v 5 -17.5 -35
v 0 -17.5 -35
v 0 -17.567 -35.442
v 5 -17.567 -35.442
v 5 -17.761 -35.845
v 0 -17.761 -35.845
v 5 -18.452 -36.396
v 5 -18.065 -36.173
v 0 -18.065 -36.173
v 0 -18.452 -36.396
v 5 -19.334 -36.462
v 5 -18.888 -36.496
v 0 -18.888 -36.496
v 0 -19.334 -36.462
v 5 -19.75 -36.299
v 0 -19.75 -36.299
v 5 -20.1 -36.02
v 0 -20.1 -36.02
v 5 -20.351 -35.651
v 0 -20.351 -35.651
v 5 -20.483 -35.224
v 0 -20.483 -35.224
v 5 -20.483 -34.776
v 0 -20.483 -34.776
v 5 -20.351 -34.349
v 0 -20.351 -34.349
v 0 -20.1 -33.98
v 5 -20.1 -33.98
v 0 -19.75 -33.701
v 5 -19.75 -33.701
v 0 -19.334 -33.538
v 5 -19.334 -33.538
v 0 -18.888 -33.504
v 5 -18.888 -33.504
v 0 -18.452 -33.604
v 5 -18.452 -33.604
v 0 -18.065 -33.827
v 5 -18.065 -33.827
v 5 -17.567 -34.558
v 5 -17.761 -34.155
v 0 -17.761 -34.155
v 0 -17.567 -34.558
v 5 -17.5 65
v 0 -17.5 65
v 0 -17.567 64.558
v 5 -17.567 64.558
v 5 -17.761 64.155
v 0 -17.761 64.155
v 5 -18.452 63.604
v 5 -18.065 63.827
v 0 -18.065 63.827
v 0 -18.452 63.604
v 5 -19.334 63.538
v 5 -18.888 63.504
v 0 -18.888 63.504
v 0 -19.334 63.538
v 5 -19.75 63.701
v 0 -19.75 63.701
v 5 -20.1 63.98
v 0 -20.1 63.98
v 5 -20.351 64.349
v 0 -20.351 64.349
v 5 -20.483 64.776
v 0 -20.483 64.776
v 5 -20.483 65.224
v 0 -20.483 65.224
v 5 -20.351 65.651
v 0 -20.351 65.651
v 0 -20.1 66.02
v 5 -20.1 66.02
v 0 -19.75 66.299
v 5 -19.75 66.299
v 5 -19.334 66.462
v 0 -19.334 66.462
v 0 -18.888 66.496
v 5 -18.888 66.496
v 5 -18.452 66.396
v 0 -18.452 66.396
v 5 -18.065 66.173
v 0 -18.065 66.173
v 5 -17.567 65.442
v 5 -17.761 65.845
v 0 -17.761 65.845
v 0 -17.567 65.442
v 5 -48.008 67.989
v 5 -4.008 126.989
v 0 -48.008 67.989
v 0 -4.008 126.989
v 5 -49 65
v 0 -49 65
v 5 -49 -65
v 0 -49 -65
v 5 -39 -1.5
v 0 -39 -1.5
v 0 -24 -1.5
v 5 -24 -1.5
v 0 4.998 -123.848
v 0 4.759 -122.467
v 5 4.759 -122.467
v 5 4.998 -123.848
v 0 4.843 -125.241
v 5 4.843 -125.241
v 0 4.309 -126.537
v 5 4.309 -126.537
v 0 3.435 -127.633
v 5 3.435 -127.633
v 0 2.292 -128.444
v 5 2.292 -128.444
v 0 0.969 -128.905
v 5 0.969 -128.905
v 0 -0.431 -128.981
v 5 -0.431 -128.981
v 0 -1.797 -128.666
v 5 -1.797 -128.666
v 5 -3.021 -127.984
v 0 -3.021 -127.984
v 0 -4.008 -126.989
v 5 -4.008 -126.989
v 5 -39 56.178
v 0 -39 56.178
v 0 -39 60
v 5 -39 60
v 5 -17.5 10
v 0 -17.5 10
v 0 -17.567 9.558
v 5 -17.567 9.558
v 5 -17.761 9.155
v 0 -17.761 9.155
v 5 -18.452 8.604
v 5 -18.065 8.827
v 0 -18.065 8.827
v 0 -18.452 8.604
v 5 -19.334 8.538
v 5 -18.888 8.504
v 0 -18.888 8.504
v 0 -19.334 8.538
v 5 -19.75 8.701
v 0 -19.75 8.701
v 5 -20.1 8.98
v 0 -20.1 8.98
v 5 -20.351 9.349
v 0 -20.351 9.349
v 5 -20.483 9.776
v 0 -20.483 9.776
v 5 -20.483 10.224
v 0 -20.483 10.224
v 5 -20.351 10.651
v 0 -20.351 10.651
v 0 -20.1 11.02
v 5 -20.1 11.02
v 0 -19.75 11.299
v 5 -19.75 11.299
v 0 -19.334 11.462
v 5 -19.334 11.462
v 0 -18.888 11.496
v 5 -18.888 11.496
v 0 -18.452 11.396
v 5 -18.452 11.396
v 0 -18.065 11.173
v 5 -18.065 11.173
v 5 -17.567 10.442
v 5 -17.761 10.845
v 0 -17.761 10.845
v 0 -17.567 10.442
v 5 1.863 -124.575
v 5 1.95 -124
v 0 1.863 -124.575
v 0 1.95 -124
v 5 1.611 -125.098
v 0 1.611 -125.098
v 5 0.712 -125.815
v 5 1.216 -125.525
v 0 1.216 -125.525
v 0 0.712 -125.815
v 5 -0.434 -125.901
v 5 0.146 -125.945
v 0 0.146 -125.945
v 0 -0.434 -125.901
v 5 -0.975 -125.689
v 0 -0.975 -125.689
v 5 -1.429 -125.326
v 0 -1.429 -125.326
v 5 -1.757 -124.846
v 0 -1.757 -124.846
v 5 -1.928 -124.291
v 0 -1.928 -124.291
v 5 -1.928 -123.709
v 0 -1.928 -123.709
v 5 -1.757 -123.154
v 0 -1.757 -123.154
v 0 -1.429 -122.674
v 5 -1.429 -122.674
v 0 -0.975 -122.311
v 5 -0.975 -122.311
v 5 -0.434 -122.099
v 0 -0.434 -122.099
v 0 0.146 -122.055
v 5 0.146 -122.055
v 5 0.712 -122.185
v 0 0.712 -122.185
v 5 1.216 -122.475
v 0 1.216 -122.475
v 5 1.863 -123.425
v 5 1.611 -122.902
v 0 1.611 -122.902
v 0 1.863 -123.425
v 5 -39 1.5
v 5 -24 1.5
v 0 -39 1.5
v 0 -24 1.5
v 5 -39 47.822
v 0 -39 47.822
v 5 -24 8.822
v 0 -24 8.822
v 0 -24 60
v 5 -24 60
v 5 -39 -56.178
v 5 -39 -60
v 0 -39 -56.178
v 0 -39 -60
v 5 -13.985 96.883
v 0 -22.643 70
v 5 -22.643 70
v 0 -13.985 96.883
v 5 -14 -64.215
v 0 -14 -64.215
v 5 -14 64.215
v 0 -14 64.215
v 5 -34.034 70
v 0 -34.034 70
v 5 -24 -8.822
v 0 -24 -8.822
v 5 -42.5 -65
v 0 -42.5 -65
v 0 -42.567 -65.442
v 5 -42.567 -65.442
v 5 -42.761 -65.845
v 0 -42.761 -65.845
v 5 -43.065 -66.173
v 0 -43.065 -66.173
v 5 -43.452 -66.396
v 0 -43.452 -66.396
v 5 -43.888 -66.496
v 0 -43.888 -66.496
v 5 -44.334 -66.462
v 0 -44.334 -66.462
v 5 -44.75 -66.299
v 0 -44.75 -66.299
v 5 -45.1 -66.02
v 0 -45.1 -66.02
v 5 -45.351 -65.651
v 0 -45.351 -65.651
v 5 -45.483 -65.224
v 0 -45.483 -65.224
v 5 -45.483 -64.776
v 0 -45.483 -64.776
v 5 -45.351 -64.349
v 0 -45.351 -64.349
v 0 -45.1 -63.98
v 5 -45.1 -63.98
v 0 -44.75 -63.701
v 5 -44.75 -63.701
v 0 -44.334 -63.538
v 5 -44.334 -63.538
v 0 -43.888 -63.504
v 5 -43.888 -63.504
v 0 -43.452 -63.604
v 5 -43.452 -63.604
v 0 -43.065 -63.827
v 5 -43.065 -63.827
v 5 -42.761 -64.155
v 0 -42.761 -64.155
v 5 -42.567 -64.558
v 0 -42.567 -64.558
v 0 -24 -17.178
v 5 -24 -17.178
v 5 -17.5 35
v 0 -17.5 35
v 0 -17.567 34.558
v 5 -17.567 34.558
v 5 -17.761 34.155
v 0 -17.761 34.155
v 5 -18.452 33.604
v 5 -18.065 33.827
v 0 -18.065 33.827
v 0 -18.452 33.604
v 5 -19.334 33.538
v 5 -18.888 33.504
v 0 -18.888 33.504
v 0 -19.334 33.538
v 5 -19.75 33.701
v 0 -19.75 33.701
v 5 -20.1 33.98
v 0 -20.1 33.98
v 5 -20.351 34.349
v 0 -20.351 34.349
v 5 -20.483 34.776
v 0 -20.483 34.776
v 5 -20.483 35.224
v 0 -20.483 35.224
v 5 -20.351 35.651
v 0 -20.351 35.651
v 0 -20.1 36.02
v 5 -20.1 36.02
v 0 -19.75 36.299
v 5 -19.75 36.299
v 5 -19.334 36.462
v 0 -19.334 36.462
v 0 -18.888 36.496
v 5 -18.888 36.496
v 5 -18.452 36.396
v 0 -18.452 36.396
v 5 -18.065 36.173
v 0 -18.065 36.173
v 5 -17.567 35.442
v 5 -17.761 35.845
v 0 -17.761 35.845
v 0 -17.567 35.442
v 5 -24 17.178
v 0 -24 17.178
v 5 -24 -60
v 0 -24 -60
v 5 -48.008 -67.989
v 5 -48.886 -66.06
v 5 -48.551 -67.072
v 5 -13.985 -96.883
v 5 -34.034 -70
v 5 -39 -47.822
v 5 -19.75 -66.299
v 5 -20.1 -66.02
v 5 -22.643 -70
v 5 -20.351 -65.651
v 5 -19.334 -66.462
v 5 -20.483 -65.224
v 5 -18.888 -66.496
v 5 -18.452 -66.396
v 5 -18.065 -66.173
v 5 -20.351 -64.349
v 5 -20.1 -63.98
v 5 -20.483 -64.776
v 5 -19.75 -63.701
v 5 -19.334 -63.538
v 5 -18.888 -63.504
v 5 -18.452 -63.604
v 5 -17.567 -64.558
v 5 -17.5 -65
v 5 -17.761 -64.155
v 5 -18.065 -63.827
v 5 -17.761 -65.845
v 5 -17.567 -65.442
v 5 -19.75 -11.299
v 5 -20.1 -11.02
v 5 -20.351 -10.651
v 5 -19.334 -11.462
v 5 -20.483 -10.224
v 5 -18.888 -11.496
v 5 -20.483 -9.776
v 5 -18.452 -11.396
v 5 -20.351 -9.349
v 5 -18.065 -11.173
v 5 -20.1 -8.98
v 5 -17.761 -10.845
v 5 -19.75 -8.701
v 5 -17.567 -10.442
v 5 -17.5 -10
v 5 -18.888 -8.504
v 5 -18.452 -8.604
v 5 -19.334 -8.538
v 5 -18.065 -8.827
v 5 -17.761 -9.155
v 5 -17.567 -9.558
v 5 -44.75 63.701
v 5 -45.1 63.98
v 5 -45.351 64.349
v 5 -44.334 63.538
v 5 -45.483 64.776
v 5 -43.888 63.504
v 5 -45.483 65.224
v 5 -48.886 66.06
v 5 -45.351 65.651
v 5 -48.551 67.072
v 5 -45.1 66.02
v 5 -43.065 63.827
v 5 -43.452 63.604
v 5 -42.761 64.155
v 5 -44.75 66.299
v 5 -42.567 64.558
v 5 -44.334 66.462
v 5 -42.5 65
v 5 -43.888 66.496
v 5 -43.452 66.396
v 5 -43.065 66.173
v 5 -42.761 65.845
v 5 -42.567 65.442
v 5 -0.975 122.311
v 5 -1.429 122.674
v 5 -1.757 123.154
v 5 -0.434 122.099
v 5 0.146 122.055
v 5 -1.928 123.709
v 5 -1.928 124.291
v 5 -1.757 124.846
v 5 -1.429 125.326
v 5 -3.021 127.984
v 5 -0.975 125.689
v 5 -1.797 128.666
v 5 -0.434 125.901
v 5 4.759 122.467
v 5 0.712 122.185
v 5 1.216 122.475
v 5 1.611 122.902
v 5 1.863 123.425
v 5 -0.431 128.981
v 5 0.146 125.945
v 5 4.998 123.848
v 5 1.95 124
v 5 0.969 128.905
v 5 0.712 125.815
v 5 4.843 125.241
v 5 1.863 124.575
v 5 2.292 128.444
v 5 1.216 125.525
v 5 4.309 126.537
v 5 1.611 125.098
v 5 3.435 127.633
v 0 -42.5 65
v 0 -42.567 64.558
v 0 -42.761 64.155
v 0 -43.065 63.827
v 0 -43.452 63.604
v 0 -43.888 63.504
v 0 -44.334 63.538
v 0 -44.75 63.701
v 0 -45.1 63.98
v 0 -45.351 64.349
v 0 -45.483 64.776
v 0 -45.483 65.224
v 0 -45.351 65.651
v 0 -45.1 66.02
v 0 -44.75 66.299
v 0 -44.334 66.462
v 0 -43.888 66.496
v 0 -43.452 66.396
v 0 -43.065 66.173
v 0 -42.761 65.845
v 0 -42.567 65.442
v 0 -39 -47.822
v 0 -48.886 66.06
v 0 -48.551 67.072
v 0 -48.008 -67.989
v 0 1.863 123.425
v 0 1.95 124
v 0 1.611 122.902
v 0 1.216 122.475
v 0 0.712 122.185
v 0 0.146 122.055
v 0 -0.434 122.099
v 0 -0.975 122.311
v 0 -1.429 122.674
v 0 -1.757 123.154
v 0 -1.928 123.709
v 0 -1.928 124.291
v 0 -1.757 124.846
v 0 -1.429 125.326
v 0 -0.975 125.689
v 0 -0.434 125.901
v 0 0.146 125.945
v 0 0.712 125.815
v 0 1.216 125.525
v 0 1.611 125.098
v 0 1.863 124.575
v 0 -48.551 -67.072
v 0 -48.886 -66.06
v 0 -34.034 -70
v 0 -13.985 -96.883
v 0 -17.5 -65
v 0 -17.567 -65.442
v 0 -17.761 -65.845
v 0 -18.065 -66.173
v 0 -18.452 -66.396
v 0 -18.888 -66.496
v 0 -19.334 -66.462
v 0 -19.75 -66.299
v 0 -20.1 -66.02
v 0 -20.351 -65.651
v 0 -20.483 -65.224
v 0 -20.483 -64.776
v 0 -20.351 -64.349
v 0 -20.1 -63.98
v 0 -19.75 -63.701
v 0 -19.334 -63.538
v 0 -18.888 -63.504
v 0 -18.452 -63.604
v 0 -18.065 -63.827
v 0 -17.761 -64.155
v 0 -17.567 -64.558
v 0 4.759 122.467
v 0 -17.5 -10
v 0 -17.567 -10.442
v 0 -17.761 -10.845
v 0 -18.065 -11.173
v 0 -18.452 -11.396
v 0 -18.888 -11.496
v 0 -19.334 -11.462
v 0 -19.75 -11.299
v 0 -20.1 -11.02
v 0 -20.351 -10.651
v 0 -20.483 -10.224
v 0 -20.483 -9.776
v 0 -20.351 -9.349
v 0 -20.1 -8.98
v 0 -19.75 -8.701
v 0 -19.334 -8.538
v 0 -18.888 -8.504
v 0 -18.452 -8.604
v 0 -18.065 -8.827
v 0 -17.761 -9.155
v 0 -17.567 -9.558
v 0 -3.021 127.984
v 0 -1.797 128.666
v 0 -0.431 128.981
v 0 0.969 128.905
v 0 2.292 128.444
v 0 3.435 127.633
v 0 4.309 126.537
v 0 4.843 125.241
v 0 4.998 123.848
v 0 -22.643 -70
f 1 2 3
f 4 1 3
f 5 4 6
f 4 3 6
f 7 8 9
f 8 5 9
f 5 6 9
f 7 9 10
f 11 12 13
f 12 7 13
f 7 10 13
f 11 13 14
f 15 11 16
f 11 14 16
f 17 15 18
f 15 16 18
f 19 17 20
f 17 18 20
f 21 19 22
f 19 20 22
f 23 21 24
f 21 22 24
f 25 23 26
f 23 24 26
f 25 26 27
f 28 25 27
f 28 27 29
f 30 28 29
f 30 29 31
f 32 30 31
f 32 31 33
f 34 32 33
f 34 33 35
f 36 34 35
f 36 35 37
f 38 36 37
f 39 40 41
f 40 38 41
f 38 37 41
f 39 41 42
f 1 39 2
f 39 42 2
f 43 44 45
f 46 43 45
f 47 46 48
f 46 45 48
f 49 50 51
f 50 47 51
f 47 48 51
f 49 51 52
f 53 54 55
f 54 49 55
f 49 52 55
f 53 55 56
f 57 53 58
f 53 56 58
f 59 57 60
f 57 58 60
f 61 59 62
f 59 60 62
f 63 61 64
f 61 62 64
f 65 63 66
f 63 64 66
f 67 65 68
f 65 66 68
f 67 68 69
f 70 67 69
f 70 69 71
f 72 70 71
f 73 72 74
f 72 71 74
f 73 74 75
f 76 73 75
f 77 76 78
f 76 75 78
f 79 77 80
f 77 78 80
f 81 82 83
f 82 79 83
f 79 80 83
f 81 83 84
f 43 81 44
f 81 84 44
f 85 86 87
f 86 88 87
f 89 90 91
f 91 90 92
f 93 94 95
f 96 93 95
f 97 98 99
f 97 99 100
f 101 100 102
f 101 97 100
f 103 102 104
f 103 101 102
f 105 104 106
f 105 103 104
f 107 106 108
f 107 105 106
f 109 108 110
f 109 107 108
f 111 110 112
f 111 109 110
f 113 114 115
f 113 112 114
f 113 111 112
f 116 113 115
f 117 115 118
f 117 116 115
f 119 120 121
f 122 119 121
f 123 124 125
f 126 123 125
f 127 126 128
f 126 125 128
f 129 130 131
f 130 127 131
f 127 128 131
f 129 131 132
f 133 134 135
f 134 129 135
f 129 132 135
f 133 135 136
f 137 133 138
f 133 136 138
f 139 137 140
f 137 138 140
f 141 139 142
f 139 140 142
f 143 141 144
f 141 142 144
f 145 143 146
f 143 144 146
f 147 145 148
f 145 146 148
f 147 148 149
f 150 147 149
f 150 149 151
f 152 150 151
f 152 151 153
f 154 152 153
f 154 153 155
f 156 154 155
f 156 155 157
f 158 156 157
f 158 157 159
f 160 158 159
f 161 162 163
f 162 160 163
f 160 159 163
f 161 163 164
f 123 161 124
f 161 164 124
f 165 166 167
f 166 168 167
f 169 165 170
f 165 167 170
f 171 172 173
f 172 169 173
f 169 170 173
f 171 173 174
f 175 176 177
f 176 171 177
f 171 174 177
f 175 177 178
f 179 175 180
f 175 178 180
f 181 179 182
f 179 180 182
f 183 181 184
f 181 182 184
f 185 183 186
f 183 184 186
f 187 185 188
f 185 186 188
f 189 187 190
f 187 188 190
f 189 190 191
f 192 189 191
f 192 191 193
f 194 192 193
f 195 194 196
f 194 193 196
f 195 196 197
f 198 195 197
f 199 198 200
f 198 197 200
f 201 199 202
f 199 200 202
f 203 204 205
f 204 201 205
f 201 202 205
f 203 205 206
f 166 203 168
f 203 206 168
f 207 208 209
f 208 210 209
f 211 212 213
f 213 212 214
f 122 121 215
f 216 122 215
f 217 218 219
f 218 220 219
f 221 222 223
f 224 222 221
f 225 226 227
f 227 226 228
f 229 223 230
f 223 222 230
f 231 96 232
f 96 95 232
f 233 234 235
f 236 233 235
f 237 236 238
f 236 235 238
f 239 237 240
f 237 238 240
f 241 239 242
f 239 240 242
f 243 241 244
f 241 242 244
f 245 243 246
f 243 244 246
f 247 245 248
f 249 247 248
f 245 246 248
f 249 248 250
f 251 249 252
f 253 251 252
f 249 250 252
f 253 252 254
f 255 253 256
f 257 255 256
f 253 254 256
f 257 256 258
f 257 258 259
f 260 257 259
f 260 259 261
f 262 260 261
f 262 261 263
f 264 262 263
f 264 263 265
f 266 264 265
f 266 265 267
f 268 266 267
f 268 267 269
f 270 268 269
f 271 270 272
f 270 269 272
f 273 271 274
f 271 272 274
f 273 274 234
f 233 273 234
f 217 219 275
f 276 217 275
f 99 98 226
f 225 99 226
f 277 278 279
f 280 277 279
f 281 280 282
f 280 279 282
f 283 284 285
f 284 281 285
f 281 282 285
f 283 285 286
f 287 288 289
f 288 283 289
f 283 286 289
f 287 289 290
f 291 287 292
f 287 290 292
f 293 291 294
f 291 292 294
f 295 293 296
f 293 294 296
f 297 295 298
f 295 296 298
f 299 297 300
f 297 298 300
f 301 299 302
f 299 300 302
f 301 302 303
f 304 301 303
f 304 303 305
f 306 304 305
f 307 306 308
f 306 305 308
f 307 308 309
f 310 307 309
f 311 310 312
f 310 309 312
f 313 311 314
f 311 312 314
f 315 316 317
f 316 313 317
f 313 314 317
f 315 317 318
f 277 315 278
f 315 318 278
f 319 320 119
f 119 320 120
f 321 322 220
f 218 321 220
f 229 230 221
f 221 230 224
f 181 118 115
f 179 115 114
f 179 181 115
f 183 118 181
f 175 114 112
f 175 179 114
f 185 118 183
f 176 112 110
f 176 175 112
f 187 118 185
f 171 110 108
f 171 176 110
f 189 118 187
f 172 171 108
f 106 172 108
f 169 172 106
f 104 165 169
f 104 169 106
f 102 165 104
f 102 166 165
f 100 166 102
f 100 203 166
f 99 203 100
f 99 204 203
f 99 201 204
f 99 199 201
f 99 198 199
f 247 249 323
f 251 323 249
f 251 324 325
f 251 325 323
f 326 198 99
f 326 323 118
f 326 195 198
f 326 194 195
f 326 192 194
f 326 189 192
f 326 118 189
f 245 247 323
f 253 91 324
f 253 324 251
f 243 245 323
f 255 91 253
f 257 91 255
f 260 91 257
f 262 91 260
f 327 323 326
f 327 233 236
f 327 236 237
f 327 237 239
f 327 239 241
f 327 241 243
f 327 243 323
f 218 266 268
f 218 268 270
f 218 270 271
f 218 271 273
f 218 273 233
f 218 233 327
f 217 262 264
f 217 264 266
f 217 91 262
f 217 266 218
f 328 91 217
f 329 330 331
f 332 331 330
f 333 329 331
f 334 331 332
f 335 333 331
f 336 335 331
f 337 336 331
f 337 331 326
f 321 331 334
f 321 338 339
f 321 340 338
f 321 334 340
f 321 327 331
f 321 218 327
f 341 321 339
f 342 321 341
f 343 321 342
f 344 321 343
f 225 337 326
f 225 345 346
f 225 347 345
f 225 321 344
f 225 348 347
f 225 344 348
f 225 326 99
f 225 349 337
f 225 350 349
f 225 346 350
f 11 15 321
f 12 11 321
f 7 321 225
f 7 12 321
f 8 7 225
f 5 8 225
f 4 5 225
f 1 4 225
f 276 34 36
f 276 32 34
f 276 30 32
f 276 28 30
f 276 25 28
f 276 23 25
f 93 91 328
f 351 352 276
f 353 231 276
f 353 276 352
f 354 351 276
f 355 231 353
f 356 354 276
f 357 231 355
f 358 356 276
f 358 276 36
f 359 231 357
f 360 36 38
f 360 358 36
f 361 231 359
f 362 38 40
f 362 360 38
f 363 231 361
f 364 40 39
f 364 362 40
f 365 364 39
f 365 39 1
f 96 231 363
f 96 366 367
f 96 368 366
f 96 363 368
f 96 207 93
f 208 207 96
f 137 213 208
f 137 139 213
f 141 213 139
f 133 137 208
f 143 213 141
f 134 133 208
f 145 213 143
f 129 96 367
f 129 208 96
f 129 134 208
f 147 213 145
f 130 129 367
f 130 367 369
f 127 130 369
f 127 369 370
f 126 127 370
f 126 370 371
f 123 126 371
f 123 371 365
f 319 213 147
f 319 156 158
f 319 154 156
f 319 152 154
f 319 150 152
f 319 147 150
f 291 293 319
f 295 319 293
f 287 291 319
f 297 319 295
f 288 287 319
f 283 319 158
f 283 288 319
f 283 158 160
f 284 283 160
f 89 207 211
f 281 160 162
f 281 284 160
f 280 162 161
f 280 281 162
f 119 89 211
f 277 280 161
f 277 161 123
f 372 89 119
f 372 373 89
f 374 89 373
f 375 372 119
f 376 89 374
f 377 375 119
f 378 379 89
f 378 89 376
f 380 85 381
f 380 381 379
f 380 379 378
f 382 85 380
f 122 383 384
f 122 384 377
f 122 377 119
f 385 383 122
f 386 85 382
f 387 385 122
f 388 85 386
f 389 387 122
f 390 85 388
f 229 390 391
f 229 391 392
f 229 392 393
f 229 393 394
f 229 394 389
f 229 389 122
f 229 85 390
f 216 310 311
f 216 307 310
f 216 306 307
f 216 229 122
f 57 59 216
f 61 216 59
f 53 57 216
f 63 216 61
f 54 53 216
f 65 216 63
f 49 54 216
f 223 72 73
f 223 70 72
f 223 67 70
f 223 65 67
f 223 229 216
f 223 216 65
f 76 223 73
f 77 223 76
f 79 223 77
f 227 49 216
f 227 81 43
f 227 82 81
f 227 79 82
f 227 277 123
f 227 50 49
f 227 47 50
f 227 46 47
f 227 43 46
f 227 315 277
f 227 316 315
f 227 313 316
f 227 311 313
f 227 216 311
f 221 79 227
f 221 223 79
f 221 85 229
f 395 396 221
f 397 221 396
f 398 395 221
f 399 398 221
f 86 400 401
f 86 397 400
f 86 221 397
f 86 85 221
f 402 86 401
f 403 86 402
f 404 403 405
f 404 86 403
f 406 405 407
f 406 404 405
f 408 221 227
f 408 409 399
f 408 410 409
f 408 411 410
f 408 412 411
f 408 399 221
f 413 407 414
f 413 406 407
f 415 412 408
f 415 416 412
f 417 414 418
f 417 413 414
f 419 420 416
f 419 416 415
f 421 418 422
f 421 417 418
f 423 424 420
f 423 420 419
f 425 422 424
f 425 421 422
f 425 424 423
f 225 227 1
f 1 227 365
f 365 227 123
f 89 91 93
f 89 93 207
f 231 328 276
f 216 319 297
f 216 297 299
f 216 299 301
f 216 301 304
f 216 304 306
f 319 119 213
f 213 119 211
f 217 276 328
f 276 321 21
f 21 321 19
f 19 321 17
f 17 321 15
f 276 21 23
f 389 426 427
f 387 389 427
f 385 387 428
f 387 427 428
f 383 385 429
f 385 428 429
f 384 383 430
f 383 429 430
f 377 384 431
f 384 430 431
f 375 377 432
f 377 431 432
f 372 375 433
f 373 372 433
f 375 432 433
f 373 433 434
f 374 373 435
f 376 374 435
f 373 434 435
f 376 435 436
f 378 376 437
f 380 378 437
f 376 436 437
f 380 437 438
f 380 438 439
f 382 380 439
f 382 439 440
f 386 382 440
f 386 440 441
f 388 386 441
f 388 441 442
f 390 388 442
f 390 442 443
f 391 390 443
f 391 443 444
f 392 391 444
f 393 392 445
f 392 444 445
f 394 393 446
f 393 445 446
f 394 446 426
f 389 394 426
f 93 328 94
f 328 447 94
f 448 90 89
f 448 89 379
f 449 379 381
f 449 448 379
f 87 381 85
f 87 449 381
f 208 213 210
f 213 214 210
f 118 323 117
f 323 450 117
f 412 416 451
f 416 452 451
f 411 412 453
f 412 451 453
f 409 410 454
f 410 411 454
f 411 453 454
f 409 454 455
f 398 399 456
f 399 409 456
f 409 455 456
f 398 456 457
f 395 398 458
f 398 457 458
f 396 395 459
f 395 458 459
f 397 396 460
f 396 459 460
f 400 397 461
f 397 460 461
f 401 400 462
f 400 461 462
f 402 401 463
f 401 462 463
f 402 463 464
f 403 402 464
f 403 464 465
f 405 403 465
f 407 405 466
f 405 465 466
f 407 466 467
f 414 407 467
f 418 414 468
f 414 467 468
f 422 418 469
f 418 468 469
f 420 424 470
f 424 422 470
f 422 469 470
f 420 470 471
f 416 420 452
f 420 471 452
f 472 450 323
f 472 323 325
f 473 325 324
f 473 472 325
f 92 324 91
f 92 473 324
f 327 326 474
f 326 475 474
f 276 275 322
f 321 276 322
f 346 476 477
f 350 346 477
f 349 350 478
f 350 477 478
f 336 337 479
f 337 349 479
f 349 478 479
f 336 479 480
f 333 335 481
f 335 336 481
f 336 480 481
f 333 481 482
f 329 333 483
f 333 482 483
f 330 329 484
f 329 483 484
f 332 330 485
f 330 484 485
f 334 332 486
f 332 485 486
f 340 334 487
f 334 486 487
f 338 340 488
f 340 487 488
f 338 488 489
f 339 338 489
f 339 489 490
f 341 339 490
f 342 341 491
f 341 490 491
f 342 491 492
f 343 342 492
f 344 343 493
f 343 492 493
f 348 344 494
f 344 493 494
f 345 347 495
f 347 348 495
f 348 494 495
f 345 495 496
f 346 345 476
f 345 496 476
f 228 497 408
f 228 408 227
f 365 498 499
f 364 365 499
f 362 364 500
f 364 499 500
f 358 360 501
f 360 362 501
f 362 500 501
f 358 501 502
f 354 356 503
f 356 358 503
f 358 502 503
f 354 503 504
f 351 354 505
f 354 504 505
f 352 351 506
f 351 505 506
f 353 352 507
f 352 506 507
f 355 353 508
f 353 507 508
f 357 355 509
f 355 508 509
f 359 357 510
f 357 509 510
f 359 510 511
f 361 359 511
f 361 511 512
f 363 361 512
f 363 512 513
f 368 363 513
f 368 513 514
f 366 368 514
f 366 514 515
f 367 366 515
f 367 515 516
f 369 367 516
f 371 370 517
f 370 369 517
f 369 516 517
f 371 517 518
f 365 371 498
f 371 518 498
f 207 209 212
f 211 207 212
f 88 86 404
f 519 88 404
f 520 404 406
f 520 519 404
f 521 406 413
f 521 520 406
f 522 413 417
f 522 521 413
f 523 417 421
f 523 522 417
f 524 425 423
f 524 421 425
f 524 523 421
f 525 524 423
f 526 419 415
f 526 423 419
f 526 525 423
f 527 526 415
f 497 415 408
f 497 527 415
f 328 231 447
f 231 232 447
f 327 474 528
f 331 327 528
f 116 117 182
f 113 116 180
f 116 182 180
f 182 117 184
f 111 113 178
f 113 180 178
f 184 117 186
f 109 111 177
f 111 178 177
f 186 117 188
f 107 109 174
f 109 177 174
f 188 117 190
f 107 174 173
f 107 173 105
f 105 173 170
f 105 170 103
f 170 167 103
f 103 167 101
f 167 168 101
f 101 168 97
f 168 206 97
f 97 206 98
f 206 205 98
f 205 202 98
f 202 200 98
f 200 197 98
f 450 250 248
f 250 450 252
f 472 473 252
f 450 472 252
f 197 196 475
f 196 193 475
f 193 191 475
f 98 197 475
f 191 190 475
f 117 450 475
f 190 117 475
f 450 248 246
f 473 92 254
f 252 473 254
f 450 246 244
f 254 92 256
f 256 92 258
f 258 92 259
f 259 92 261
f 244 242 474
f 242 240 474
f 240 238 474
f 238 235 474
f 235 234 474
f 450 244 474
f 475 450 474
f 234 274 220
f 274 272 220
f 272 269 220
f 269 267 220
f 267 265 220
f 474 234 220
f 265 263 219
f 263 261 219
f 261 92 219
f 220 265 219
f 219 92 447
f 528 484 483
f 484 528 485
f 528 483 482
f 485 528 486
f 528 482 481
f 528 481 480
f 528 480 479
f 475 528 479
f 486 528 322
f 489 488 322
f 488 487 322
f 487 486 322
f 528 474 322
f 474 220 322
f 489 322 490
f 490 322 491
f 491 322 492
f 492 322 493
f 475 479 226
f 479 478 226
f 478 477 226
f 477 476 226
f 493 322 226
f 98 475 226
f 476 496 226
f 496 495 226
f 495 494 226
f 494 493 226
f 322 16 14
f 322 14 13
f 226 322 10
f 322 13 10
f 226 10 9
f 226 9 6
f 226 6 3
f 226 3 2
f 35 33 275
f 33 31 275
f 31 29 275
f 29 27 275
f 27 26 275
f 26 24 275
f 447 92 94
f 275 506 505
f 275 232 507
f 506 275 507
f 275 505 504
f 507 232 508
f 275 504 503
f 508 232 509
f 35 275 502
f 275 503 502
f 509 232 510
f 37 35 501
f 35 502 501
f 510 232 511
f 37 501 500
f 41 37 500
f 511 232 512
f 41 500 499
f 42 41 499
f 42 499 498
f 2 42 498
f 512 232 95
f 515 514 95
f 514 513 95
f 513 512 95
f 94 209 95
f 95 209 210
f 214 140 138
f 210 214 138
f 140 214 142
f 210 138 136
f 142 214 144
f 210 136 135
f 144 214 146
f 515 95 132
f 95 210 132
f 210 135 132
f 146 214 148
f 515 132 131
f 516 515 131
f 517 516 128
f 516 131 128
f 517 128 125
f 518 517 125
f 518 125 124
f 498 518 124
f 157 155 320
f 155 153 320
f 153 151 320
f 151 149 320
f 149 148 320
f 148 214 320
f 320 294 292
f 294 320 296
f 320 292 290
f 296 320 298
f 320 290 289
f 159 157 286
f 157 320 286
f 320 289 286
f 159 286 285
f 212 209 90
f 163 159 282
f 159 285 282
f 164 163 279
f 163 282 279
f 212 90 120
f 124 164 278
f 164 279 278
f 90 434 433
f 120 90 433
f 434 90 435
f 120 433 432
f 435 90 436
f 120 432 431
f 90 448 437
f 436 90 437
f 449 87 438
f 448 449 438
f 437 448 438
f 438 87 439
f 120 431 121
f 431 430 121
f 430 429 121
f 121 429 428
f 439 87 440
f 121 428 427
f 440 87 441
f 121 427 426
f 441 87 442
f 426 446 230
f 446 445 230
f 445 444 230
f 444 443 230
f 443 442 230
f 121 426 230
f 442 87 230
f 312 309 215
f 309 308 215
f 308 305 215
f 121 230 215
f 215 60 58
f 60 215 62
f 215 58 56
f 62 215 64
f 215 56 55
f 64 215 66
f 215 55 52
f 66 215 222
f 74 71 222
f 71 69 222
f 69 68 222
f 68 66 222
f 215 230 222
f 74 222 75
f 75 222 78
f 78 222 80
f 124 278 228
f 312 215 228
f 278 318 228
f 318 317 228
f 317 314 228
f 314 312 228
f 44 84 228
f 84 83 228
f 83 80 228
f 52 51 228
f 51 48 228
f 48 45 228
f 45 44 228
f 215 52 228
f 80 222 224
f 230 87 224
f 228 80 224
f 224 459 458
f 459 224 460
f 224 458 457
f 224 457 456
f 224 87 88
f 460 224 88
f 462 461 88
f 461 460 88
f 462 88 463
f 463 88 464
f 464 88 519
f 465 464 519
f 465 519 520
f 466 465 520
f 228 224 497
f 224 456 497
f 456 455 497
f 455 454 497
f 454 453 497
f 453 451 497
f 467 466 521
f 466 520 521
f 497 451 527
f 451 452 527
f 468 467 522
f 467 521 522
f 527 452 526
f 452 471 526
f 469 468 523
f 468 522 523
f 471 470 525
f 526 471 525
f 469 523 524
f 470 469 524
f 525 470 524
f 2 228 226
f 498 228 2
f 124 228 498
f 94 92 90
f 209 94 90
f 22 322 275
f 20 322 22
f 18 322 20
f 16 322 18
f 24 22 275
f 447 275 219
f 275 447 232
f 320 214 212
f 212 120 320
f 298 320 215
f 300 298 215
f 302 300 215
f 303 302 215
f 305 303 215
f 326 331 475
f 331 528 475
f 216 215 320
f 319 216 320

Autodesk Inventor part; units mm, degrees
ref_plane "YZ Plane" through (0, 0, 0) normal (1, 0, 0) x (0, 1, 0)
ref_plane "XZ Plane" through (0, 0, 0) normal (0, 1, 0) x (-1, 0, 0)
sketch "Sketch1" plane through (0, 0, 0) normal (1, 0, 0) x (0, 1, 0)
  circle A0 centre (0, -124) radius 1.95
  circle A1 centre (0, 124) radius 1.95
  circle A2 centre (-19, -65) radius 1.5
  circle A3 centre (-19, 65) radius 1.5
  line L0 (0, 124) -> (-19, 65) construction
  line L1 (4.7593, 122.4673) -> (-14.2407, 63.4673)
  line L2 (-23.7593, 66.5327) -> (-4.7593, 125.5327)
  arc A4 (4.7593, 122.4673) -> (-4.7593, 125.5327) centre (0, 124) ccw
  arc A5 (-23.7593, 66.5327) -> (-14.2407, 63.4673) centre (-19, 65) ccw
  line L3 (-19, 65) -> (-19, -65) construction
  line L4 (-24, 65) -> (-24, -65)
  line L5 (-14, -65) -> (-14, 65)
  arc A6 (-14, 65) -> (-24, 65) centre (-19, 65) ccw
  arc A7 (-24, -65) -> (-14, -65) centre (-19, -65) ccw
  line L6 (-19, -65) -> (0, -124) construction
  line L7 (-23.7593, -66.5327) -> (-4.7593, -125.5327)
  line L8 (4.7593, -122.4673) -> (-14.2407, -63.4673)
  arc A8 (-14.2407, -63.4673) -> (-23.7593, -66.5327) centre (-19, -65) ccw
  arc A9 (-4.7593, -125.5327) -> (4.7593, -122.4673) centre (0, -124) ccw
  circle A10 centre (-44, 65) radius 1.5
  circle A11 centre (-44, -65) radius 1.5
  line L9 (-19, 65) -> (-44, 65) construction
  line L10 (-19, 70) -> (-44, 70)
  line L11 (-44, 60) -> (-19, 60)
  arc A12 (-19, 60) -> (-19, 70) centre (-19, 65) ccw
  arc A13 (-44, 70) -> (-44, 60) centre (-44, 65) ccw
  line L12 (-19, -65) -> (-44, -65) construction
  line L13 (-19, -60) -> (-44, -60)
  line L14 (-44, -70) -> (-19, -70)
  arc A14 (-19, -70) -> (-19, -60) centre (-19, -65) ccw
  arc A15 (-44, -60) -> (-44, -70) centre (-44, -65) ccw
  line L15 (0, 124) -> (-44, 65) construction
  line L16 (-4.0081, 126.9891) -> (-48.0081, 67.9891)
  line L17 (-39.9919, 62.0109) -> (4.0081, 121.0109)
  arc A16 (4.0081, 121.0109) -> (-4.0081, 126.9891) centre (0, 124) ccw
  arc A17 (-48.0081, 67.9891) -> (-39.9919, 62.0109) centre (-44, 65) ccw
  line L18 (-44, -65) -> (0, -124) construction
  line L19 (-48.0081, -67.9891) -> (-4.0081, -126.9891)
  line L20 (4.0081, -121.0109) -> (-39.9919, -62.0109)
  arc A18 (-39.9919, -62.0109) -> (-48.0081, -67.9891) centre (-44, -65) ccw
  arc A19 (-4.0081, -126.9891) -> (4.0081, -121.0109) centre (0, -124) ccw
  line L21 (-44, 65) -> (-44, -65) construction
  line L22 (-49, 65) -> (-49, -65)
  line L23 (-39, -65) -> (-39, 65)
  arc A20 (-39, 65) -> (-49, 65) centre (-44, 65) ccw
  arc A21 (-49, -65) -> (-39, -65) centre (-44, -65) ccw
  line L24 (-44, 65) -> (-19, 0) construction
  line L25 (-45.4, 64.4615) -> (-20.4, -0.5385)
  line L26 (-17.6, 0.5385) -> (-42.6, 65.5385)
  arc A22 (-42.6, 65.5385) -> (-45.4, 64.4615) centre (-44, 65) ccw
  arc A23 (-20.4, -0.5385) -> (-17.6, 0.5385) centre (-19, 0) ccw
  line L27 (-44, -65) -> (-19, 0) construction
  line L28 (-42.6, -65.5385) -> (-17.6, -0.5385)
  line L29 (-20.4, 0.5385) -> (-45.4, -64.4615)
  arc A24 (-45.4, -64.4615) -> (-42.6, -65.5385) centre (-44, -65) ccw
  arc A25 (-17.6, -0.5385) -> (-20.4, 0.5385) centre (-19, 0) ccw
  line L30 (-19, 0) -> (-44, 0) construction
  line L31 (-19, 1.5) -> (-44, 1.5)
  line L32 (-44, -1.5) -> (-19, -1.5)
  arc A26 (-19, -1.5) -> (-19, 1.5) centre (-19, 0) ccw
  arc A27 (-44, 1.5) -> (-44, -1.5) centre (-44, 0) ccw
  circle A28 centre (-19, -10) radius 1.5
  circle A29 centre (-19, -35) radius 1.5
  circle A30 centre (-19, 10) radius 1.5
  circle A31 centre (-19, 35) radius 1.5
  point P0 (0, 0)
  point P1 (-9.5, 94.5)
  point P2 (-9.5, -94.5)
  point P3 (-14, -64.2148)
  point P4 (-14, 64.2148)
  point P5 (-24, 65)
  point P6 (-31.5, 65)
  point P7 (-31.5, -65)
  point P8 (-22, 94.5)
  point P9 (-22, -94.5)
  point P10 (-44, 0)
  point P11 (-31.5, 32.5)
  point P12 (-31.5, -32.5)
  point P13 (-39, 47.8215)
  point P14 (-24, 8.8215)
  point P15 (-24, 17.1785)
  point P16 (-40.4698, 60)
  point P17 (-24, 60)
  point P18 (-22.6427, 70)
  point P19 (-34.0339, 70)
  point P20 (-13.9854, 96.8832)
  point P21 (-6.8749, 118.9633)
  point P22 (-43.3898, 70)
  point P23 (-49, 65)
  point P24 (-43.3898, -70)
  point P25 (-6.8749, -118.9633)
  point P26 (-13.9854, -96.8832)
  point P27 (-34.0339, -70)
  point P28 (-22.6427, -70)
  point P29 (-24, -60)
  point P30 (-40.4698, -60)
  point P31 (-24, -17.1785)
  point P32 (-24, -8.8215)
  point P33 (-39, -47.8215)
  point P34 (-31.5, 0)
  point P35 (-39, -1.5)
  point P36 (-24, -1.5)
  point P37 (-24, 1.5)
  point P38 (-39, 1.5)
  point P39 (-49, 65)
  point P40 (-4.0081, -126.9891)
  point P41 (-39, 60)
  point P42 (-39, -60)
  point P43 (-39, -56.1785)
  point P44 (-39, 56.1785)
  dimension "d2" = 3.9
  dimension "d4" = 3.9
  dimension "d25" = 3
  dimension "d28" = 3
  dimension "d43" = 59
  dimension "d44" = 65
  dimension "d45" = 65
  dimension "d47" = 59
  dimension "d48" = 10
  dimension "d49" = 10
  dimension "d50" = 10
  dimension "d52" = 14
  dimension "d53" = 3
  dimension "d54" = 3
  dimension "d55" = 10
  dimension "d56" = 10
  dimension "d57" = 25
  dimension "d58" = 25
  dimension "d59" = 10
  dimension "d60" = 10
  dimension "d61" = 10
  dimension "d62" = 3
  dimension "d63" = 3
  dimension "d64" = 3
  dimension "d65" = 3
  dimension "d66" = 3
  dimension "d67" = 10
  dimension "d68" = 25
  dimension "d69" = 3
  dimension "d70" = 3
  dimension "d71" = 10
  dimension "d72" = 25
extrude "Extrusion1" add sketch "Sketch1" along normal blind 5 contours A16 L17 L2 A4 | L1 L5 A6 L10 L2 L17 A16 | L5 L8 A8 L13 L4 L28 A23 L26 L11 A5 L1 | L1 A12 L5 | A4 L2 L17 L10 A13 L16 | A5 A6 A12 | L8 A19 L20 L7 L14 A7 L5 | L5 A14 L8 | A13 A20 L23 L17 A17 L26 A10 L25 | L11 L4 A5 | A7 A8 A14 | A9 L7 L20 A19 | A6 L2 L10 | L10 L17 L23 A20 | A13 L11 L25 L23 L31 A27 L32 L29 L13 A15 L22 | L2 A5 L4 L11 L23 L17 L10 | L14 L7 A7 | L19 A15 L14 L20 L7 A9 | A8 L4 L13 | A17 L25 L11 | A15 A18 L29 A11 L28 L20 L23 A21 | L23 L11 L26 A17 L17 | L26 A25 L31 L25 L4 | L4 L25 L23 L26 | L23 L26 L11 | L7 L14 L20 L23 L13 L4 A7 | L25 A17 L26 L11 | L11 L26 L23 L25 | L25 A10 L26 A17 | L13 L29 A18 | L25 L31 L4 | A23 L25 L29 A25 | L14 A21 L23 L20 | L28 L23 L29 L4 | L4 L29 L32 A23 L28 | L23 L20 A18 L28 L13 | L13 L28 L23 | L29 L23 L28 L13 | L13 L28 A18 L29 | A18 L28 A11 L29 | L31 L25 L29 L32 L4 | L4 L32 L23 L31 | L31 A25 L29 L25 | L4 L32 L29 | L23 L32 A27 L31 | L25 A23 L32 L29
sketch "Sketch7" plane through (5, 0, 0) normal (1, 0, 0) x (0, 0, -1)
  circle A0 centre (-65, -19) radius 1.5 projected
  circle A1 centre (-35, -19) radius 1.5 projected
  circle A2 centre (-10, -19) radius 1.5 projected
  circle A3 centre (35, -19) radius 1.5 projected
  circle A4 centre (10, -19) radius 1.5 projected
  circle A5 centre (65, -19) radius 1.5 projected
  circle A6 centre (124, 0) radius 1.95 projected
  line L0 (-17.1785, -24) -> (-56.1785, -39) projected
  line L1 (-56.1785, -39) -> (-60, -39) projected
  line L2 (-60, -39) -> (-60, -24) projected
  line L3 (-60, -24) -> (-17.1785, -24) projected
  circle A7 centre (65, -44) radius 1.5 projected
  circle A8 centre (-65, -44) radius 1.5 projected
  line L4 (-96.8832, -13.9854) -> (-70, -22.6427) projected
  line L5 (-70, -22.6427) -> (-70, -34.0339) projected
  line L6 (-70, -34.0339) -> (-96.8832, -13.9854) projected
  line L7 (-1.5, -39) -> (-47.8215, -39) projected
  line L8 (-47.8215, -39) -> (-8.8215, -24) projected
  line L9 (-8.8215, -24) -> (-1.5, -24) projected
  line L10 (-1.5, -24) -> (-1.5, -39) projected
  line L11 (8.8215, -24) -> (47.8215, -39) projected
  line L12 (47.8215, -39) -> (1.5, -39) projected
  line L13 (1.5, -39) -> (1.5, -24) projected
  line L14 (1.5, -24) -> (8.8215, -24) projected
  line L15 (60, -24) -> (60, -39) projected
  line L16 (60, -39) -> (56.1785, -39) projected
  line L17 (56.1785, -39) -> (17.1785, -24) projected
  line L18 (17.1785, -24) -> (60, -24) projected
  line L19 (96.8832, -13.9854) -> (70, -34.0339) projected
  line L20 (70, -34.0339) -> (70, -22.6427) projected
  line L21 (70, -22.6427) -> (96.8832, -13.9854) projected
  arc A9 (126.9891, -4.0081) -> (122.4673, 4.7593) centre (124, 0) ccw projected
  line L22 (122.4673, 4.7593) -> (64.2148, -14) projected
  line L23 (64.2148, -14) -> (-64.2148, -14) projected
  line L24 (-64.2148, -14) -> (-122.4673, 4.7593) projected
  arc A10 (-122.4673, 4.7593) -> (-126.9891, -4.0081) centre (-124, 0) ccw projected
  line L25 (-126.9891, -4.0081) -> (-67.9891, -48.0081) projected
  arc A11 (-67.9891, -48.0081) -> (-65, -49) centre (-65, -44) ccw projected
  line L26 (-65, -49) -> (65, -49) projected
  arc A12 (65, -49) -> (67.9891, -48.0081) centre (65, -44) ccw projected
  line L27 (67.9891, -48.0081) -> (126.9891, -4.0081) projected
  circle A13 centre (-124, 0) radius 1.95 projected
  point P0 (0, 0)
properties part number "Horizontal_bar_V2"
